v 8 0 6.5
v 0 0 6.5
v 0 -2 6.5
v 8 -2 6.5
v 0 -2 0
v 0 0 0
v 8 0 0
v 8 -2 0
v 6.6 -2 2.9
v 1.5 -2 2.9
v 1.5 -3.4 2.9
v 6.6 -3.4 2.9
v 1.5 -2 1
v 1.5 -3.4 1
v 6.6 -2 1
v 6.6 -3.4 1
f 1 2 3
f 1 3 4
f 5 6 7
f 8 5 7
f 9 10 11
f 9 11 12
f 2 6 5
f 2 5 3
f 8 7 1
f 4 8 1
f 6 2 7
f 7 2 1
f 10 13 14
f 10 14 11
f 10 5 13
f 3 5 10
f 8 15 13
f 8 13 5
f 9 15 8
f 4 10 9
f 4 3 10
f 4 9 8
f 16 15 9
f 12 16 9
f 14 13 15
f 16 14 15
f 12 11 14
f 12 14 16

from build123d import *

# Parameters (mm, degrees)
SKETCH_W     = 8
SKETCH_H     = 6.5
PAD_DEPTH    = 2
SKETCH001_W  = 5.1
SKETCH001_H  = 1.9
PAD001_DEPTH = 1.4


with BuildPart() as part:
    # Sketch → Pad (new body)
    with BuildSketch(Plane.XZ):
        with Locations((4, 3.25)):
            Rectangle(SKETCH_W, SKETCH_H)
    extrude(amount=PAD_DEPTH)

    # Sketch001 (on Face6 of Pad) → Pad001 (join)
    with BuildSketch(Plane.XZ.offset(2)):
        with Locations((4.05, 1.95)):
            Rectangle(SKETCH001_W, SKETCH001_H)
    extrude(amount=PAD001_DEPTH)


solid = part.part
